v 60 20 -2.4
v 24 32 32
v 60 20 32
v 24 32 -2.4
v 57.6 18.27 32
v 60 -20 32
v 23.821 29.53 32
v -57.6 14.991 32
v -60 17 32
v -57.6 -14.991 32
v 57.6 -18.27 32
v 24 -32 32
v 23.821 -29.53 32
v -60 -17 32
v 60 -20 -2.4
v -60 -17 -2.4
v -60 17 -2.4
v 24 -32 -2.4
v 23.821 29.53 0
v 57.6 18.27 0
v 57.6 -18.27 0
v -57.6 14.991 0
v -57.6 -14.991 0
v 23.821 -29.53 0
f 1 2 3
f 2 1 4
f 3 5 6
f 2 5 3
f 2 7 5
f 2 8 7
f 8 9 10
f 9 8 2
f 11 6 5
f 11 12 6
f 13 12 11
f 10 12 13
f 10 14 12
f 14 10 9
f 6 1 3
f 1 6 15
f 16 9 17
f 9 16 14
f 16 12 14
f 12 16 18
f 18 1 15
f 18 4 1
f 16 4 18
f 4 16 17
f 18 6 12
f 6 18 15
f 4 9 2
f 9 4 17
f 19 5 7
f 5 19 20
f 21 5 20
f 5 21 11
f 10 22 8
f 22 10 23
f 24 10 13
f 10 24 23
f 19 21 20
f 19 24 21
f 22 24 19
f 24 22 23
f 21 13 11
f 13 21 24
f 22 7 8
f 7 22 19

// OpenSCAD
// fit-check helper: the coffin box's walls and floor with no mechanism
module coffin_2d(o = 0) offset(delta = o) polygon([[-60, -17], [24, -32], [60, -20], [60, 20], [24, 32], [-60, 17]]);
difference() { translate([0, 0, -2.4]) linear_extrude(34.4) coffin_2d(0); linear_extrude(33) coffin_2d(-2.4); }
